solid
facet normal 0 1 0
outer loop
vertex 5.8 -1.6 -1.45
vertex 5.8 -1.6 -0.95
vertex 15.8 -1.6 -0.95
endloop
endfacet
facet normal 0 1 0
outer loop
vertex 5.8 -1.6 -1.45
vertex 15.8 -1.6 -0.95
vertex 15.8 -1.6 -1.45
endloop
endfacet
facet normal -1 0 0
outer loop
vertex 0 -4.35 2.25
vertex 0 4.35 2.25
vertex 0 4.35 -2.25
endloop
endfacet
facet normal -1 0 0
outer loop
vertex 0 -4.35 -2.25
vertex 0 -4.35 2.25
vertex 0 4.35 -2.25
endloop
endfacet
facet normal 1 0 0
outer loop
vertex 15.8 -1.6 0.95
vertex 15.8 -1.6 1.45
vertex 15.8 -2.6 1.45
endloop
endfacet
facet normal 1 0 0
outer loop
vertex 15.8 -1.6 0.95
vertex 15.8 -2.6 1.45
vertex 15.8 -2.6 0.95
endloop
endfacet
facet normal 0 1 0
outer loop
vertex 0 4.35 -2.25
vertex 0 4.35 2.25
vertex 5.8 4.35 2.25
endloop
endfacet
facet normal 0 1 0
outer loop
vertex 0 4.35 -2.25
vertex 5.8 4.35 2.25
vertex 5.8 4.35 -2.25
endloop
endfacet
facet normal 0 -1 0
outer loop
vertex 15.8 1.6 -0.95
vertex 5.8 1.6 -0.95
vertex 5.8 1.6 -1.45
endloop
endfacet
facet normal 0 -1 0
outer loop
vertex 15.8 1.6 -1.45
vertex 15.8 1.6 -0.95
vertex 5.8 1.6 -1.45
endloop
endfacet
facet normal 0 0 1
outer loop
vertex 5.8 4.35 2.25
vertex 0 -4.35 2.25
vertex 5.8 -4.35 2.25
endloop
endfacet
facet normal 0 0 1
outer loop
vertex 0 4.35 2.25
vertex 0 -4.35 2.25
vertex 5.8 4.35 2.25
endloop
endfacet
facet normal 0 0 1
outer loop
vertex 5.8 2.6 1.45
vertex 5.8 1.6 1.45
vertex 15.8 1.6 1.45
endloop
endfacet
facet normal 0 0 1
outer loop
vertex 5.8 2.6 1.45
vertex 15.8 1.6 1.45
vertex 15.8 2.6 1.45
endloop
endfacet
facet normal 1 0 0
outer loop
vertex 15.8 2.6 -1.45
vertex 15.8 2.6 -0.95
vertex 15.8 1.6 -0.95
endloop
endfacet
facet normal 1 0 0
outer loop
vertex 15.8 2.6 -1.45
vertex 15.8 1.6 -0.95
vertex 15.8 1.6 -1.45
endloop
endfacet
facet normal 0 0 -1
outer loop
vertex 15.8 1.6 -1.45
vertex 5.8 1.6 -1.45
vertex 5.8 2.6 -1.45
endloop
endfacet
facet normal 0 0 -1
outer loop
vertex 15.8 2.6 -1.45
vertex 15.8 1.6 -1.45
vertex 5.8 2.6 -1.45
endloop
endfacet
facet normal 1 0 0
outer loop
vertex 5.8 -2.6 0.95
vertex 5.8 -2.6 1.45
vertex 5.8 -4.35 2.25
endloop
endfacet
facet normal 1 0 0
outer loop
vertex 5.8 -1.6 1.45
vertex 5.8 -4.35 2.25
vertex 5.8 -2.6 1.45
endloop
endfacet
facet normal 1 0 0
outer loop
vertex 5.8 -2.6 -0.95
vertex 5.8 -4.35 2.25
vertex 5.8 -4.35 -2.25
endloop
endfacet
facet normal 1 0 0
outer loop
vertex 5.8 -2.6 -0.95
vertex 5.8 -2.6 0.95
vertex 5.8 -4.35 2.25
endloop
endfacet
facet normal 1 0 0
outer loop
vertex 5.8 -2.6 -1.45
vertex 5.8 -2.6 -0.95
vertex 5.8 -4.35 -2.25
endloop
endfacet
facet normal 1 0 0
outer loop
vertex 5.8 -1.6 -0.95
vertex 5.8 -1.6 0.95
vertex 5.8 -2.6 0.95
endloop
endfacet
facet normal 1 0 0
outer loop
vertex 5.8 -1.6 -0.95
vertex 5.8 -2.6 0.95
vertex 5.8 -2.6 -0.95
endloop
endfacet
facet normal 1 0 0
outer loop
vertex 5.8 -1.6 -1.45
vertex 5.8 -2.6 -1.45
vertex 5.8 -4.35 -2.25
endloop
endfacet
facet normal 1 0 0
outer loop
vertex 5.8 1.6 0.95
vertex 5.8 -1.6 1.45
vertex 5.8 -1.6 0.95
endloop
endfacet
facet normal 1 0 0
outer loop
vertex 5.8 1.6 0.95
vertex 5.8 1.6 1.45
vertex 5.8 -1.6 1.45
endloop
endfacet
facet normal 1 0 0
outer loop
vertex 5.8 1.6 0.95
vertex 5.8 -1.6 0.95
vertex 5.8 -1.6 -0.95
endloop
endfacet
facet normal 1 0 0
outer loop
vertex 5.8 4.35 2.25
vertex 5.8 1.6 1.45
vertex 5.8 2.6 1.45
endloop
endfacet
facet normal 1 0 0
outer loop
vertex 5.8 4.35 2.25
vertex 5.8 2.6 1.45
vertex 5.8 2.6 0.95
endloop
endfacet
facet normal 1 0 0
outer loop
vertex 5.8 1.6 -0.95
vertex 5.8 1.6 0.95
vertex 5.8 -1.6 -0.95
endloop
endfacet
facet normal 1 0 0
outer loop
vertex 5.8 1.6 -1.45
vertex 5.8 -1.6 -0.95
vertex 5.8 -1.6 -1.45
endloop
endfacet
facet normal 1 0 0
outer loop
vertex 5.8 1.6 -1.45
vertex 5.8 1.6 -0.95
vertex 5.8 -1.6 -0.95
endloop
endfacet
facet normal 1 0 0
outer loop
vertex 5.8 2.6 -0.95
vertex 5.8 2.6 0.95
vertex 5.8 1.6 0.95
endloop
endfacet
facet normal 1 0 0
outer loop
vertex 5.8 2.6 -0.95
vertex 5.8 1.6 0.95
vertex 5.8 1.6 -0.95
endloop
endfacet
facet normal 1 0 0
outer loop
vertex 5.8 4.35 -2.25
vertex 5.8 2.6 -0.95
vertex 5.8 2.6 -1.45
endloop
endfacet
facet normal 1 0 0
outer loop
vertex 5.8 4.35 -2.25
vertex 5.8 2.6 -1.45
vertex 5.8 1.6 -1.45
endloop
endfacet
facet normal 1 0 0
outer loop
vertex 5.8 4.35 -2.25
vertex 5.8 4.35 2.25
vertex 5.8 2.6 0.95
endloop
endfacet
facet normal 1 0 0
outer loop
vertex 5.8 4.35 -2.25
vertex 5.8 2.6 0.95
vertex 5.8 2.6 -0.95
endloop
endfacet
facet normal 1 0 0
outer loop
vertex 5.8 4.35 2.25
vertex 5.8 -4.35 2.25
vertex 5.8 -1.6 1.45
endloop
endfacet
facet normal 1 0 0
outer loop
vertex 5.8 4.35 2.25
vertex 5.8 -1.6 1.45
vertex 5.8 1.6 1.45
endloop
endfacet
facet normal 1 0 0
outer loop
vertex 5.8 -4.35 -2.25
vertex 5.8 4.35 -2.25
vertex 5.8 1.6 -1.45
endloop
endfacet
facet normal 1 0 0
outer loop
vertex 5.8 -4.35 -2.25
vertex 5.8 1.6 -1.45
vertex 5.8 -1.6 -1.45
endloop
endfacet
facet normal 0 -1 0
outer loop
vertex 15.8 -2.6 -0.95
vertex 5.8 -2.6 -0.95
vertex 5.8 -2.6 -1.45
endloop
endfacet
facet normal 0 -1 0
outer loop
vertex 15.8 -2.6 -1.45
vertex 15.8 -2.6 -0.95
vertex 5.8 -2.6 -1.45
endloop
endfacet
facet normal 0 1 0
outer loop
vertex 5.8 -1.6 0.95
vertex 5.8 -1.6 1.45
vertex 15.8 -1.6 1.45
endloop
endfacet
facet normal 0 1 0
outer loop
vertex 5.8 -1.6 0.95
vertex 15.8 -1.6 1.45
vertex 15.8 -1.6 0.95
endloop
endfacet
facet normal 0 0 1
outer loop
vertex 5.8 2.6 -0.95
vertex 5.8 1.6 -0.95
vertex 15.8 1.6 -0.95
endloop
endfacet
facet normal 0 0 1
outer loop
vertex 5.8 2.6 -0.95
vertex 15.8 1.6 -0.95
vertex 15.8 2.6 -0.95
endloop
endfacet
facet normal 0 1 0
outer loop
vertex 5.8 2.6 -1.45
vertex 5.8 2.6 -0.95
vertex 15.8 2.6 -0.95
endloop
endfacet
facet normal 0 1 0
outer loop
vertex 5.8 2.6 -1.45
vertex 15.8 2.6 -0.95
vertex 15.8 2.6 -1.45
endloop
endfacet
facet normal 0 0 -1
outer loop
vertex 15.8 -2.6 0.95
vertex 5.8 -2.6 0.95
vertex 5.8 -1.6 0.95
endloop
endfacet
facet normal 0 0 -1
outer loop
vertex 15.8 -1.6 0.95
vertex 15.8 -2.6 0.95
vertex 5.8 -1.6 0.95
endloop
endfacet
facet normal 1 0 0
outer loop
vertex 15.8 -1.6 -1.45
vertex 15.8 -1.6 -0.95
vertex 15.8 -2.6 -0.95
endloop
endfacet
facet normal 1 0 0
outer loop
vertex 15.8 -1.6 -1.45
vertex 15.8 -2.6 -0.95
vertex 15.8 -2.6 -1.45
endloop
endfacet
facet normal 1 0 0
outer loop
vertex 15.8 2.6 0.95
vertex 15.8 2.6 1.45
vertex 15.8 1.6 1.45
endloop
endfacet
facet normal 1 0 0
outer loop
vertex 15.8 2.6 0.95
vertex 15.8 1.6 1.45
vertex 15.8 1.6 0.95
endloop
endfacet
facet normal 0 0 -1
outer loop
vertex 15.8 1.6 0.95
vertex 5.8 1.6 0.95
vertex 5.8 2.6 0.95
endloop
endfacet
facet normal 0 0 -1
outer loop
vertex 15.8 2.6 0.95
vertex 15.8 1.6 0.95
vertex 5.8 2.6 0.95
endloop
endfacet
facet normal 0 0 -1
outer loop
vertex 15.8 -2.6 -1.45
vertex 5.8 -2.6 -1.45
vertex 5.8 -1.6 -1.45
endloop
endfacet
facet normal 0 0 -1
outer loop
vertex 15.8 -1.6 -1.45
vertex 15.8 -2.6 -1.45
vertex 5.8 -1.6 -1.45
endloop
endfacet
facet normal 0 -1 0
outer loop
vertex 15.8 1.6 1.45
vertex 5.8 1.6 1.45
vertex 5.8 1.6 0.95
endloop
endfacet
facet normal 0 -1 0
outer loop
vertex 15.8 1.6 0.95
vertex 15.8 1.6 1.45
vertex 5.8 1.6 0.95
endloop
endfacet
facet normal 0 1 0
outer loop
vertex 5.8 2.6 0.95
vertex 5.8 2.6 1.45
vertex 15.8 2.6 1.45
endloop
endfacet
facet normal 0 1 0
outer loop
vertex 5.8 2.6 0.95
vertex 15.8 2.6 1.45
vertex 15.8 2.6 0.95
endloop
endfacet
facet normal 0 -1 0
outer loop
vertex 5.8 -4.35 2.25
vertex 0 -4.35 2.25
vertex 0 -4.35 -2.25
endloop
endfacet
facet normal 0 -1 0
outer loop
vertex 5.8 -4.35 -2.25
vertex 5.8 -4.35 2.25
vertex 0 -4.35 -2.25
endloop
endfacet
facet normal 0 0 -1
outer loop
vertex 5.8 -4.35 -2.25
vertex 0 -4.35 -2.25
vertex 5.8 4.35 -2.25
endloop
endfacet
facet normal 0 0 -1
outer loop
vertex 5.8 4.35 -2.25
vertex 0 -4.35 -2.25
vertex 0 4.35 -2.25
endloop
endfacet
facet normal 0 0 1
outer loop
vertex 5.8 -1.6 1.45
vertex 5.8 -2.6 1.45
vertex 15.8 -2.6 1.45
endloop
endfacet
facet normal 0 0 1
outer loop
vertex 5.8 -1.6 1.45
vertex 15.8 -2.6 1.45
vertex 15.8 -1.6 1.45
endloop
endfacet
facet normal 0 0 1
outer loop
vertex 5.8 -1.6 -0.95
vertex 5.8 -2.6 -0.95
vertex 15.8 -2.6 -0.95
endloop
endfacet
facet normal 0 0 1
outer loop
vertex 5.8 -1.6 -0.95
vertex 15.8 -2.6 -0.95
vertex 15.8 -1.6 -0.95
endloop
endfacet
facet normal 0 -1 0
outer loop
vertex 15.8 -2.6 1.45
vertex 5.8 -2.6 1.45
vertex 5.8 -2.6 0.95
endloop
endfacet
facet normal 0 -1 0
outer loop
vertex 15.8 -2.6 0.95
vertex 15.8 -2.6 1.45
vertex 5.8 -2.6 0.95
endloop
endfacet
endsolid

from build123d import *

# Parameters (mm, degrees)
SKETCH1_W           = 4.5
SKETCH1_H           = 8.7
BOSS_EXTRUDE1_DEPTH = 5.8
SKETCH2_W           = 0.5
SKETCH2_H           = 1
BOSS_EXTRUDE2_DEPTH = 10


with BuildPart() as part:
    # Sketch1 → Boss-Extrude1 (new body)
    with BuildSketch(Plane(origin=(0, 0, 0), x_dir=(0, 0, -1), z_dir=(1, 0, 0))):
        Rectangle(SKETCH1_W, SKETCH1_H)
    extrude(amount=BOSS_EXTRUDE1_DEPTH)

    # Sketch2 → Boss-Extrude2 (add)
    with BuildSketch(Plane(origin=(5.8, 0, 0), x_dir=(0, 0, -1), z_dir=(1, 0, 0))):
        with Locations((-1.2, -2.1)):
            Rectangle(SKETCH2_W, SKETCH2_H)
        with Locations((-1.2, 2.1)):
            Rectangle(SKETCH2_W, SKETCH2_H)
        with Locations((1.2, 2.1)):
            Rectangle(SKETCH2_W, SKETCH2_H)
        with Locations((1.2, -2.1)):
            Rectangle(SKETCH2_W, SKETCH2_H)
    extrude(amount=BOSS_EXTRUDE2_DEPTH)


solid = part.part
